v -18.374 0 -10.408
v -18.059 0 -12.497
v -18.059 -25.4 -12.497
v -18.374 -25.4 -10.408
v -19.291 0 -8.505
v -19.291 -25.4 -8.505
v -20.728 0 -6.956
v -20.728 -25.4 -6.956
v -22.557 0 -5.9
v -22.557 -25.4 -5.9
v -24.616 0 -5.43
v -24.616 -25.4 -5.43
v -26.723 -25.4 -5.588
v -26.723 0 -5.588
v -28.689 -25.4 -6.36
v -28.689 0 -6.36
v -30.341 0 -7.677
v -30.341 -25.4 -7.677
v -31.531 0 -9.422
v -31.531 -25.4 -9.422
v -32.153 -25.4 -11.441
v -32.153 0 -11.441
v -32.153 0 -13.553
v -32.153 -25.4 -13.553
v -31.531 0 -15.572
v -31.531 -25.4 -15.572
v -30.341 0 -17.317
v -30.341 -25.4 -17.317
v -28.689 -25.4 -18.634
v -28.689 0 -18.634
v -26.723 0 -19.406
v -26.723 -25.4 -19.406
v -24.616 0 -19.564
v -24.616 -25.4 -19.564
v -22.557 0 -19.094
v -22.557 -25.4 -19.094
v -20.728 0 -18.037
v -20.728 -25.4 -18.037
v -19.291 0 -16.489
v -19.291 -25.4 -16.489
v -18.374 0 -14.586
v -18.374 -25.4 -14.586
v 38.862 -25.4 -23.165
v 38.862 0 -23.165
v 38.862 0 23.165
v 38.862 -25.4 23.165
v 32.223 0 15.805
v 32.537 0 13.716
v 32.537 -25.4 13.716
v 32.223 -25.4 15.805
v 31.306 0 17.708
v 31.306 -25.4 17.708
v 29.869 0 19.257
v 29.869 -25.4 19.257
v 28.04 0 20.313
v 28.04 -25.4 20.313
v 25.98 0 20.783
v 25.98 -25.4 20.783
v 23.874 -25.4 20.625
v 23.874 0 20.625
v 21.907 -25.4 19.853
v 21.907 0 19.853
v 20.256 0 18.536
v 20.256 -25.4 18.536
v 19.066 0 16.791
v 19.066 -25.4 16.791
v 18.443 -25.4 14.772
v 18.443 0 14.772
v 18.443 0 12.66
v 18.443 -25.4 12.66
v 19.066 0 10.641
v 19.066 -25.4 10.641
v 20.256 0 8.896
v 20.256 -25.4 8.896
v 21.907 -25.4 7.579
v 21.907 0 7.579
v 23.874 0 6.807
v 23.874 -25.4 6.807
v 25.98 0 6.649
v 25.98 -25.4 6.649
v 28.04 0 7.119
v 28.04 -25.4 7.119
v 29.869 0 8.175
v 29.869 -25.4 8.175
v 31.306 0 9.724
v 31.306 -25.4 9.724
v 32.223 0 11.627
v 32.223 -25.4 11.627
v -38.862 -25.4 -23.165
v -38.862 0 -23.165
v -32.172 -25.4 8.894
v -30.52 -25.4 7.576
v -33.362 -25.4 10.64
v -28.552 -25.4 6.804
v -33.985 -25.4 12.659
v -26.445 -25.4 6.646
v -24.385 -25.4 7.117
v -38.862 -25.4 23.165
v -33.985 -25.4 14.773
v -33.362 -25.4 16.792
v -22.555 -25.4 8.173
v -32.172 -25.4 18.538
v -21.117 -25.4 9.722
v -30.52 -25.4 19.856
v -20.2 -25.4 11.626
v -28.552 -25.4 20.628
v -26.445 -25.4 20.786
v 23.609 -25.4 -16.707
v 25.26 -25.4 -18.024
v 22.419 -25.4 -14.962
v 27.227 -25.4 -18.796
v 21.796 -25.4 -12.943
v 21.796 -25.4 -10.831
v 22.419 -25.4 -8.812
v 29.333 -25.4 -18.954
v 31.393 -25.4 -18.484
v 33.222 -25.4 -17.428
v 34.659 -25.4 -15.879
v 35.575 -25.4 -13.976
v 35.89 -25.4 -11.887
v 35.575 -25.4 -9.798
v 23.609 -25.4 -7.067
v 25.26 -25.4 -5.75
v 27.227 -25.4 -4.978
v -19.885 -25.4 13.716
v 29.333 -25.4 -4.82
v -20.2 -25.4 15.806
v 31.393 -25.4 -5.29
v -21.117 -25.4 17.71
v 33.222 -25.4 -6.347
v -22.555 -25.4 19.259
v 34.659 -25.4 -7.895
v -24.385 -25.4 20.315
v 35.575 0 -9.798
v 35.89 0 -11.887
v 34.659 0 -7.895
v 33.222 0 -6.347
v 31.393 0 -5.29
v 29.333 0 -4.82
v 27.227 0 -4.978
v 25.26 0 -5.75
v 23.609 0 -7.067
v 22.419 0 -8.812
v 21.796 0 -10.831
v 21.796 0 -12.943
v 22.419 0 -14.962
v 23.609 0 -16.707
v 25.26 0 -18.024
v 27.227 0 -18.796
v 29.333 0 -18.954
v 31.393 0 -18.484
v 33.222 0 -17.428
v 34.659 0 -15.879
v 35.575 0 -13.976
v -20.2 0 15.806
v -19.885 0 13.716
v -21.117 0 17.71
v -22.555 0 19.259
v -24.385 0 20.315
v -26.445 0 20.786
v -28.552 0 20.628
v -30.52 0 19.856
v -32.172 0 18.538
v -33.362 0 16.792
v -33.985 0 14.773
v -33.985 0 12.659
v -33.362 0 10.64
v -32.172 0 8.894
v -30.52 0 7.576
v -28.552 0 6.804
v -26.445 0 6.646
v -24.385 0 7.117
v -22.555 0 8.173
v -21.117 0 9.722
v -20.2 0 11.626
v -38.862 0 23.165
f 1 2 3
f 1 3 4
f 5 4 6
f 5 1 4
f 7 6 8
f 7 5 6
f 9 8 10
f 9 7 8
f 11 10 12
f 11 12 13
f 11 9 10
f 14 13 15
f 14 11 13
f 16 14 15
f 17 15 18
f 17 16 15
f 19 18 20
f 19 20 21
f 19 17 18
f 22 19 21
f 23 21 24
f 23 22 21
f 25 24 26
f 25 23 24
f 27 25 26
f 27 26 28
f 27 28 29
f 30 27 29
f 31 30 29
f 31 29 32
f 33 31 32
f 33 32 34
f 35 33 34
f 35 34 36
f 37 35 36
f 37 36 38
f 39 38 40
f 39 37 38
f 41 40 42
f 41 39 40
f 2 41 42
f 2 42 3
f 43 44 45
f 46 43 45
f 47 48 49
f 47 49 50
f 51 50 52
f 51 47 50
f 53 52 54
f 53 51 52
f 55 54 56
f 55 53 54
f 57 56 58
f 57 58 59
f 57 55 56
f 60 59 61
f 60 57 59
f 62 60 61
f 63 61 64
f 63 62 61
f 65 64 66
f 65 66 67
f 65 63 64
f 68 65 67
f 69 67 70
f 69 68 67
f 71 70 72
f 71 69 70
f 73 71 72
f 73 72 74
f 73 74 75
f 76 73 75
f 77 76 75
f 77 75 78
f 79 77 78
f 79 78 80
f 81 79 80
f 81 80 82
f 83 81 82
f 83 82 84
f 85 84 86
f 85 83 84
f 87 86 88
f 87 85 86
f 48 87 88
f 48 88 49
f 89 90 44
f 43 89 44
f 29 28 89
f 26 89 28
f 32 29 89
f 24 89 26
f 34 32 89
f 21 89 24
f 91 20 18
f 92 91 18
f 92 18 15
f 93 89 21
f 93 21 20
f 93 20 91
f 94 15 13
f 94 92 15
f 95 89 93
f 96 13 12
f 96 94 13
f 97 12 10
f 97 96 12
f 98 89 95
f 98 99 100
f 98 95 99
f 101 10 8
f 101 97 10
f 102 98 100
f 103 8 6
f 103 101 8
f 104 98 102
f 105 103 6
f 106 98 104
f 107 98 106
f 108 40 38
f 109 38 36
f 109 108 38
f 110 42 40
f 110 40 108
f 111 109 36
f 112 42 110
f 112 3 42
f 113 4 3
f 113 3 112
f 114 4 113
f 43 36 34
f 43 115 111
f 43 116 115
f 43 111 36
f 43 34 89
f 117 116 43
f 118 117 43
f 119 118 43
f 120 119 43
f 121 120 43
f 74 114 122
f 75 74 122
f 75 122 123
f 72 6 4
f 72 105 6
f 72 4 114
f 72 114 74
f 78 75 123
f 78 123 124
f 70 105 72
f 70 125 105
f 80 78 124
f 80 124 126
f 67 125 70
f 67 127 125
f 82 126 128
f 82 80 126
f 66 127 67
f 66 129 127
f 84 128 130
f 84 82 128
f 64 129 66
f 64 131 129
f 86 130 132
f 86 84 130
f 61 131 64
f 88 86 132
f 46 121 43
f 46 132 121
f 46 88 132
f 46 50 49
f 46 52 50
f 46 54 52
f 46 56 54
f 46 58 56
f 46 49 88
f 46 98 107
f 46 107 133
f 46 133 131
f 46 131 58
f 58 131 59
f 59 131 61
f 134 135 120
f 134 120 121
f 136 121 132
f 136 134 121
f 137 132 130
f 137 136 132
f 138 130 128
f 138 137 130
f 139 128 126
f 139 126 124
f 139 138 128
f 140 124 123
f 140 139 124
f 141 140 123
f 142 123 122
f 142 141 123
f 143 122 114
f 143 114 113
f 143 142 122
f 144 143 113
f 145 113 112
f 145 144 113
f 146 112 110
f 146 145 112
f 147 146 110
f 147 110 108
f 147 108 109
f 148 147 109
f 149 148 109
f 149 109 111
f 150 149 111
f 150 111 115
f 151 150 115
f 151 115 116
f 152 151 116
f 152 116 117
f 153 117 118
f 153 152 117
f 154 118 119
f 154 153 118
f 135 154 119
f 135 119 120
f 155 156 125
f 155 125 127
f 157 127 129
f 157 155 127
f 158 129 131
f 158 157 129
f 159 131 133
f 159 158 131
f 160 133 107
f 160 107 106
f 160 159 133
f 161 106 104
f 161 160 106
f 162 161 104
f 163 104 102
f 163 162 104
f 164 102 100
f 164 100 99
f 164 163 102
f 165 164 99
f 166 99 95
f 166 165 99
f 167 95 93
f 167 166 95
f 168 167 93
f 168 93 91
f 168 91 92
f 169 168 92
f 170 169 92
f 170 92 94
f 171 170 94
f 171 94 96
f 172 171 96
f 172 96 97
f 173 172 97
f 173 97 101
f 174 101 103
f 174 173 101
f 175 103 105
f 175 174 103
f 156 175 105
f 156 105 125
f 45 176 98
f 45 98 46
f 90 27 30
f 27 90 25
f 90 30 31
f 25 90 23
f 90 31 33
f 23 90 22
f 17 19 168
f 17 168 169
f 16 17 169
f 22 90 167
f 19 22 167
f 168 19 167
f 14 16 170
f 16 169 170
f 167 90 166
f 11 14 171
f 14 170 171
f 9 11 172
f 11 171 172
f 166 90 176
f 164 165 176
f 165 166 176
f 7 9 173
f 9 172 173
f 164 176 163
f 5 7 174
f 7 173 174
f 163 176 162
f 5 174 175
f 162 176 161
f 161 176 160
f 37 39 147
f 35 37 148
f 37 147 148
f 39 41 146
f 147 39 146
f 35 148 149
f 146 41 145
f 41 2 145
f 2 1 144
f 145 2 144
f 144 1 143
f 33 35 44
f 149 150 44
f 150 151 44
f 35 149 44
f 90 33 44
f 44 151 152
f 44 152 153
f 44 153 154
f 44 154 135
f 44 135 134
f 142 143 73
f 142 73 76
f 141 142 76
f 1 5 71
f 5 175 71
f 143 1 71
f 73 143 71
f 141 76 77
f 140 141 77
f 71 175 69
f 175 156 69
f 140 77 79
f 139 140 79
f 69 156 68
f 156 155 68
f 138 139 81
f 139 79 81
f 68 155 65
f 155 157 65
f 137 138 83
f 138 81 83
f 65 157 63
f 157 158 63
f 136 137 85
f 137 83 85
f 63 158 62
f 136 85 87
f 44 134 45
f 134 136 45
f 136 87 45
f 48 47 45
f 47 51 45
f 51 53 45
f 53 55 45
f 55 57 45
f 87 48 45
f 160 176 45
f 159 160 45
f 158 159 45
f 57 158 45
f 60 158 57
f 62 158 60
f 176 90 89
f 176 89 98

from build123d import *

# Parameters (mm, degrees)
F0_W     = 77.724002
F0_H     = 46.329598
F0_R     = 7.0866
F0_R_2   = 7.089467
F1_DEPTH = 25.4


with BuildPart() as f1:
    # F0 (on Front) → F1 (new body)
    with BuildSketch(Plane.XZ):
        Rectangle(F0_W, F0_H)
        with Locations((-25.146, -12.496799)):
            Circle(F0_R, mode=Mode.SUBTRACT)
        with Locations((28.803604, -11.8872)):
            Circle(F0_R, mode=Mode.SUBTRACT)
        with Locations((-26.974799, 13.716)):
            Circle(F0_R_2, mode=Mode.SUBTRACT)
        with Locations((25.450798, 13.716)):
            Circle(F0_R, mode=Mode.SUBTRACT)
    extrude(amount=F1_DEPTH)


solid = f1.part
